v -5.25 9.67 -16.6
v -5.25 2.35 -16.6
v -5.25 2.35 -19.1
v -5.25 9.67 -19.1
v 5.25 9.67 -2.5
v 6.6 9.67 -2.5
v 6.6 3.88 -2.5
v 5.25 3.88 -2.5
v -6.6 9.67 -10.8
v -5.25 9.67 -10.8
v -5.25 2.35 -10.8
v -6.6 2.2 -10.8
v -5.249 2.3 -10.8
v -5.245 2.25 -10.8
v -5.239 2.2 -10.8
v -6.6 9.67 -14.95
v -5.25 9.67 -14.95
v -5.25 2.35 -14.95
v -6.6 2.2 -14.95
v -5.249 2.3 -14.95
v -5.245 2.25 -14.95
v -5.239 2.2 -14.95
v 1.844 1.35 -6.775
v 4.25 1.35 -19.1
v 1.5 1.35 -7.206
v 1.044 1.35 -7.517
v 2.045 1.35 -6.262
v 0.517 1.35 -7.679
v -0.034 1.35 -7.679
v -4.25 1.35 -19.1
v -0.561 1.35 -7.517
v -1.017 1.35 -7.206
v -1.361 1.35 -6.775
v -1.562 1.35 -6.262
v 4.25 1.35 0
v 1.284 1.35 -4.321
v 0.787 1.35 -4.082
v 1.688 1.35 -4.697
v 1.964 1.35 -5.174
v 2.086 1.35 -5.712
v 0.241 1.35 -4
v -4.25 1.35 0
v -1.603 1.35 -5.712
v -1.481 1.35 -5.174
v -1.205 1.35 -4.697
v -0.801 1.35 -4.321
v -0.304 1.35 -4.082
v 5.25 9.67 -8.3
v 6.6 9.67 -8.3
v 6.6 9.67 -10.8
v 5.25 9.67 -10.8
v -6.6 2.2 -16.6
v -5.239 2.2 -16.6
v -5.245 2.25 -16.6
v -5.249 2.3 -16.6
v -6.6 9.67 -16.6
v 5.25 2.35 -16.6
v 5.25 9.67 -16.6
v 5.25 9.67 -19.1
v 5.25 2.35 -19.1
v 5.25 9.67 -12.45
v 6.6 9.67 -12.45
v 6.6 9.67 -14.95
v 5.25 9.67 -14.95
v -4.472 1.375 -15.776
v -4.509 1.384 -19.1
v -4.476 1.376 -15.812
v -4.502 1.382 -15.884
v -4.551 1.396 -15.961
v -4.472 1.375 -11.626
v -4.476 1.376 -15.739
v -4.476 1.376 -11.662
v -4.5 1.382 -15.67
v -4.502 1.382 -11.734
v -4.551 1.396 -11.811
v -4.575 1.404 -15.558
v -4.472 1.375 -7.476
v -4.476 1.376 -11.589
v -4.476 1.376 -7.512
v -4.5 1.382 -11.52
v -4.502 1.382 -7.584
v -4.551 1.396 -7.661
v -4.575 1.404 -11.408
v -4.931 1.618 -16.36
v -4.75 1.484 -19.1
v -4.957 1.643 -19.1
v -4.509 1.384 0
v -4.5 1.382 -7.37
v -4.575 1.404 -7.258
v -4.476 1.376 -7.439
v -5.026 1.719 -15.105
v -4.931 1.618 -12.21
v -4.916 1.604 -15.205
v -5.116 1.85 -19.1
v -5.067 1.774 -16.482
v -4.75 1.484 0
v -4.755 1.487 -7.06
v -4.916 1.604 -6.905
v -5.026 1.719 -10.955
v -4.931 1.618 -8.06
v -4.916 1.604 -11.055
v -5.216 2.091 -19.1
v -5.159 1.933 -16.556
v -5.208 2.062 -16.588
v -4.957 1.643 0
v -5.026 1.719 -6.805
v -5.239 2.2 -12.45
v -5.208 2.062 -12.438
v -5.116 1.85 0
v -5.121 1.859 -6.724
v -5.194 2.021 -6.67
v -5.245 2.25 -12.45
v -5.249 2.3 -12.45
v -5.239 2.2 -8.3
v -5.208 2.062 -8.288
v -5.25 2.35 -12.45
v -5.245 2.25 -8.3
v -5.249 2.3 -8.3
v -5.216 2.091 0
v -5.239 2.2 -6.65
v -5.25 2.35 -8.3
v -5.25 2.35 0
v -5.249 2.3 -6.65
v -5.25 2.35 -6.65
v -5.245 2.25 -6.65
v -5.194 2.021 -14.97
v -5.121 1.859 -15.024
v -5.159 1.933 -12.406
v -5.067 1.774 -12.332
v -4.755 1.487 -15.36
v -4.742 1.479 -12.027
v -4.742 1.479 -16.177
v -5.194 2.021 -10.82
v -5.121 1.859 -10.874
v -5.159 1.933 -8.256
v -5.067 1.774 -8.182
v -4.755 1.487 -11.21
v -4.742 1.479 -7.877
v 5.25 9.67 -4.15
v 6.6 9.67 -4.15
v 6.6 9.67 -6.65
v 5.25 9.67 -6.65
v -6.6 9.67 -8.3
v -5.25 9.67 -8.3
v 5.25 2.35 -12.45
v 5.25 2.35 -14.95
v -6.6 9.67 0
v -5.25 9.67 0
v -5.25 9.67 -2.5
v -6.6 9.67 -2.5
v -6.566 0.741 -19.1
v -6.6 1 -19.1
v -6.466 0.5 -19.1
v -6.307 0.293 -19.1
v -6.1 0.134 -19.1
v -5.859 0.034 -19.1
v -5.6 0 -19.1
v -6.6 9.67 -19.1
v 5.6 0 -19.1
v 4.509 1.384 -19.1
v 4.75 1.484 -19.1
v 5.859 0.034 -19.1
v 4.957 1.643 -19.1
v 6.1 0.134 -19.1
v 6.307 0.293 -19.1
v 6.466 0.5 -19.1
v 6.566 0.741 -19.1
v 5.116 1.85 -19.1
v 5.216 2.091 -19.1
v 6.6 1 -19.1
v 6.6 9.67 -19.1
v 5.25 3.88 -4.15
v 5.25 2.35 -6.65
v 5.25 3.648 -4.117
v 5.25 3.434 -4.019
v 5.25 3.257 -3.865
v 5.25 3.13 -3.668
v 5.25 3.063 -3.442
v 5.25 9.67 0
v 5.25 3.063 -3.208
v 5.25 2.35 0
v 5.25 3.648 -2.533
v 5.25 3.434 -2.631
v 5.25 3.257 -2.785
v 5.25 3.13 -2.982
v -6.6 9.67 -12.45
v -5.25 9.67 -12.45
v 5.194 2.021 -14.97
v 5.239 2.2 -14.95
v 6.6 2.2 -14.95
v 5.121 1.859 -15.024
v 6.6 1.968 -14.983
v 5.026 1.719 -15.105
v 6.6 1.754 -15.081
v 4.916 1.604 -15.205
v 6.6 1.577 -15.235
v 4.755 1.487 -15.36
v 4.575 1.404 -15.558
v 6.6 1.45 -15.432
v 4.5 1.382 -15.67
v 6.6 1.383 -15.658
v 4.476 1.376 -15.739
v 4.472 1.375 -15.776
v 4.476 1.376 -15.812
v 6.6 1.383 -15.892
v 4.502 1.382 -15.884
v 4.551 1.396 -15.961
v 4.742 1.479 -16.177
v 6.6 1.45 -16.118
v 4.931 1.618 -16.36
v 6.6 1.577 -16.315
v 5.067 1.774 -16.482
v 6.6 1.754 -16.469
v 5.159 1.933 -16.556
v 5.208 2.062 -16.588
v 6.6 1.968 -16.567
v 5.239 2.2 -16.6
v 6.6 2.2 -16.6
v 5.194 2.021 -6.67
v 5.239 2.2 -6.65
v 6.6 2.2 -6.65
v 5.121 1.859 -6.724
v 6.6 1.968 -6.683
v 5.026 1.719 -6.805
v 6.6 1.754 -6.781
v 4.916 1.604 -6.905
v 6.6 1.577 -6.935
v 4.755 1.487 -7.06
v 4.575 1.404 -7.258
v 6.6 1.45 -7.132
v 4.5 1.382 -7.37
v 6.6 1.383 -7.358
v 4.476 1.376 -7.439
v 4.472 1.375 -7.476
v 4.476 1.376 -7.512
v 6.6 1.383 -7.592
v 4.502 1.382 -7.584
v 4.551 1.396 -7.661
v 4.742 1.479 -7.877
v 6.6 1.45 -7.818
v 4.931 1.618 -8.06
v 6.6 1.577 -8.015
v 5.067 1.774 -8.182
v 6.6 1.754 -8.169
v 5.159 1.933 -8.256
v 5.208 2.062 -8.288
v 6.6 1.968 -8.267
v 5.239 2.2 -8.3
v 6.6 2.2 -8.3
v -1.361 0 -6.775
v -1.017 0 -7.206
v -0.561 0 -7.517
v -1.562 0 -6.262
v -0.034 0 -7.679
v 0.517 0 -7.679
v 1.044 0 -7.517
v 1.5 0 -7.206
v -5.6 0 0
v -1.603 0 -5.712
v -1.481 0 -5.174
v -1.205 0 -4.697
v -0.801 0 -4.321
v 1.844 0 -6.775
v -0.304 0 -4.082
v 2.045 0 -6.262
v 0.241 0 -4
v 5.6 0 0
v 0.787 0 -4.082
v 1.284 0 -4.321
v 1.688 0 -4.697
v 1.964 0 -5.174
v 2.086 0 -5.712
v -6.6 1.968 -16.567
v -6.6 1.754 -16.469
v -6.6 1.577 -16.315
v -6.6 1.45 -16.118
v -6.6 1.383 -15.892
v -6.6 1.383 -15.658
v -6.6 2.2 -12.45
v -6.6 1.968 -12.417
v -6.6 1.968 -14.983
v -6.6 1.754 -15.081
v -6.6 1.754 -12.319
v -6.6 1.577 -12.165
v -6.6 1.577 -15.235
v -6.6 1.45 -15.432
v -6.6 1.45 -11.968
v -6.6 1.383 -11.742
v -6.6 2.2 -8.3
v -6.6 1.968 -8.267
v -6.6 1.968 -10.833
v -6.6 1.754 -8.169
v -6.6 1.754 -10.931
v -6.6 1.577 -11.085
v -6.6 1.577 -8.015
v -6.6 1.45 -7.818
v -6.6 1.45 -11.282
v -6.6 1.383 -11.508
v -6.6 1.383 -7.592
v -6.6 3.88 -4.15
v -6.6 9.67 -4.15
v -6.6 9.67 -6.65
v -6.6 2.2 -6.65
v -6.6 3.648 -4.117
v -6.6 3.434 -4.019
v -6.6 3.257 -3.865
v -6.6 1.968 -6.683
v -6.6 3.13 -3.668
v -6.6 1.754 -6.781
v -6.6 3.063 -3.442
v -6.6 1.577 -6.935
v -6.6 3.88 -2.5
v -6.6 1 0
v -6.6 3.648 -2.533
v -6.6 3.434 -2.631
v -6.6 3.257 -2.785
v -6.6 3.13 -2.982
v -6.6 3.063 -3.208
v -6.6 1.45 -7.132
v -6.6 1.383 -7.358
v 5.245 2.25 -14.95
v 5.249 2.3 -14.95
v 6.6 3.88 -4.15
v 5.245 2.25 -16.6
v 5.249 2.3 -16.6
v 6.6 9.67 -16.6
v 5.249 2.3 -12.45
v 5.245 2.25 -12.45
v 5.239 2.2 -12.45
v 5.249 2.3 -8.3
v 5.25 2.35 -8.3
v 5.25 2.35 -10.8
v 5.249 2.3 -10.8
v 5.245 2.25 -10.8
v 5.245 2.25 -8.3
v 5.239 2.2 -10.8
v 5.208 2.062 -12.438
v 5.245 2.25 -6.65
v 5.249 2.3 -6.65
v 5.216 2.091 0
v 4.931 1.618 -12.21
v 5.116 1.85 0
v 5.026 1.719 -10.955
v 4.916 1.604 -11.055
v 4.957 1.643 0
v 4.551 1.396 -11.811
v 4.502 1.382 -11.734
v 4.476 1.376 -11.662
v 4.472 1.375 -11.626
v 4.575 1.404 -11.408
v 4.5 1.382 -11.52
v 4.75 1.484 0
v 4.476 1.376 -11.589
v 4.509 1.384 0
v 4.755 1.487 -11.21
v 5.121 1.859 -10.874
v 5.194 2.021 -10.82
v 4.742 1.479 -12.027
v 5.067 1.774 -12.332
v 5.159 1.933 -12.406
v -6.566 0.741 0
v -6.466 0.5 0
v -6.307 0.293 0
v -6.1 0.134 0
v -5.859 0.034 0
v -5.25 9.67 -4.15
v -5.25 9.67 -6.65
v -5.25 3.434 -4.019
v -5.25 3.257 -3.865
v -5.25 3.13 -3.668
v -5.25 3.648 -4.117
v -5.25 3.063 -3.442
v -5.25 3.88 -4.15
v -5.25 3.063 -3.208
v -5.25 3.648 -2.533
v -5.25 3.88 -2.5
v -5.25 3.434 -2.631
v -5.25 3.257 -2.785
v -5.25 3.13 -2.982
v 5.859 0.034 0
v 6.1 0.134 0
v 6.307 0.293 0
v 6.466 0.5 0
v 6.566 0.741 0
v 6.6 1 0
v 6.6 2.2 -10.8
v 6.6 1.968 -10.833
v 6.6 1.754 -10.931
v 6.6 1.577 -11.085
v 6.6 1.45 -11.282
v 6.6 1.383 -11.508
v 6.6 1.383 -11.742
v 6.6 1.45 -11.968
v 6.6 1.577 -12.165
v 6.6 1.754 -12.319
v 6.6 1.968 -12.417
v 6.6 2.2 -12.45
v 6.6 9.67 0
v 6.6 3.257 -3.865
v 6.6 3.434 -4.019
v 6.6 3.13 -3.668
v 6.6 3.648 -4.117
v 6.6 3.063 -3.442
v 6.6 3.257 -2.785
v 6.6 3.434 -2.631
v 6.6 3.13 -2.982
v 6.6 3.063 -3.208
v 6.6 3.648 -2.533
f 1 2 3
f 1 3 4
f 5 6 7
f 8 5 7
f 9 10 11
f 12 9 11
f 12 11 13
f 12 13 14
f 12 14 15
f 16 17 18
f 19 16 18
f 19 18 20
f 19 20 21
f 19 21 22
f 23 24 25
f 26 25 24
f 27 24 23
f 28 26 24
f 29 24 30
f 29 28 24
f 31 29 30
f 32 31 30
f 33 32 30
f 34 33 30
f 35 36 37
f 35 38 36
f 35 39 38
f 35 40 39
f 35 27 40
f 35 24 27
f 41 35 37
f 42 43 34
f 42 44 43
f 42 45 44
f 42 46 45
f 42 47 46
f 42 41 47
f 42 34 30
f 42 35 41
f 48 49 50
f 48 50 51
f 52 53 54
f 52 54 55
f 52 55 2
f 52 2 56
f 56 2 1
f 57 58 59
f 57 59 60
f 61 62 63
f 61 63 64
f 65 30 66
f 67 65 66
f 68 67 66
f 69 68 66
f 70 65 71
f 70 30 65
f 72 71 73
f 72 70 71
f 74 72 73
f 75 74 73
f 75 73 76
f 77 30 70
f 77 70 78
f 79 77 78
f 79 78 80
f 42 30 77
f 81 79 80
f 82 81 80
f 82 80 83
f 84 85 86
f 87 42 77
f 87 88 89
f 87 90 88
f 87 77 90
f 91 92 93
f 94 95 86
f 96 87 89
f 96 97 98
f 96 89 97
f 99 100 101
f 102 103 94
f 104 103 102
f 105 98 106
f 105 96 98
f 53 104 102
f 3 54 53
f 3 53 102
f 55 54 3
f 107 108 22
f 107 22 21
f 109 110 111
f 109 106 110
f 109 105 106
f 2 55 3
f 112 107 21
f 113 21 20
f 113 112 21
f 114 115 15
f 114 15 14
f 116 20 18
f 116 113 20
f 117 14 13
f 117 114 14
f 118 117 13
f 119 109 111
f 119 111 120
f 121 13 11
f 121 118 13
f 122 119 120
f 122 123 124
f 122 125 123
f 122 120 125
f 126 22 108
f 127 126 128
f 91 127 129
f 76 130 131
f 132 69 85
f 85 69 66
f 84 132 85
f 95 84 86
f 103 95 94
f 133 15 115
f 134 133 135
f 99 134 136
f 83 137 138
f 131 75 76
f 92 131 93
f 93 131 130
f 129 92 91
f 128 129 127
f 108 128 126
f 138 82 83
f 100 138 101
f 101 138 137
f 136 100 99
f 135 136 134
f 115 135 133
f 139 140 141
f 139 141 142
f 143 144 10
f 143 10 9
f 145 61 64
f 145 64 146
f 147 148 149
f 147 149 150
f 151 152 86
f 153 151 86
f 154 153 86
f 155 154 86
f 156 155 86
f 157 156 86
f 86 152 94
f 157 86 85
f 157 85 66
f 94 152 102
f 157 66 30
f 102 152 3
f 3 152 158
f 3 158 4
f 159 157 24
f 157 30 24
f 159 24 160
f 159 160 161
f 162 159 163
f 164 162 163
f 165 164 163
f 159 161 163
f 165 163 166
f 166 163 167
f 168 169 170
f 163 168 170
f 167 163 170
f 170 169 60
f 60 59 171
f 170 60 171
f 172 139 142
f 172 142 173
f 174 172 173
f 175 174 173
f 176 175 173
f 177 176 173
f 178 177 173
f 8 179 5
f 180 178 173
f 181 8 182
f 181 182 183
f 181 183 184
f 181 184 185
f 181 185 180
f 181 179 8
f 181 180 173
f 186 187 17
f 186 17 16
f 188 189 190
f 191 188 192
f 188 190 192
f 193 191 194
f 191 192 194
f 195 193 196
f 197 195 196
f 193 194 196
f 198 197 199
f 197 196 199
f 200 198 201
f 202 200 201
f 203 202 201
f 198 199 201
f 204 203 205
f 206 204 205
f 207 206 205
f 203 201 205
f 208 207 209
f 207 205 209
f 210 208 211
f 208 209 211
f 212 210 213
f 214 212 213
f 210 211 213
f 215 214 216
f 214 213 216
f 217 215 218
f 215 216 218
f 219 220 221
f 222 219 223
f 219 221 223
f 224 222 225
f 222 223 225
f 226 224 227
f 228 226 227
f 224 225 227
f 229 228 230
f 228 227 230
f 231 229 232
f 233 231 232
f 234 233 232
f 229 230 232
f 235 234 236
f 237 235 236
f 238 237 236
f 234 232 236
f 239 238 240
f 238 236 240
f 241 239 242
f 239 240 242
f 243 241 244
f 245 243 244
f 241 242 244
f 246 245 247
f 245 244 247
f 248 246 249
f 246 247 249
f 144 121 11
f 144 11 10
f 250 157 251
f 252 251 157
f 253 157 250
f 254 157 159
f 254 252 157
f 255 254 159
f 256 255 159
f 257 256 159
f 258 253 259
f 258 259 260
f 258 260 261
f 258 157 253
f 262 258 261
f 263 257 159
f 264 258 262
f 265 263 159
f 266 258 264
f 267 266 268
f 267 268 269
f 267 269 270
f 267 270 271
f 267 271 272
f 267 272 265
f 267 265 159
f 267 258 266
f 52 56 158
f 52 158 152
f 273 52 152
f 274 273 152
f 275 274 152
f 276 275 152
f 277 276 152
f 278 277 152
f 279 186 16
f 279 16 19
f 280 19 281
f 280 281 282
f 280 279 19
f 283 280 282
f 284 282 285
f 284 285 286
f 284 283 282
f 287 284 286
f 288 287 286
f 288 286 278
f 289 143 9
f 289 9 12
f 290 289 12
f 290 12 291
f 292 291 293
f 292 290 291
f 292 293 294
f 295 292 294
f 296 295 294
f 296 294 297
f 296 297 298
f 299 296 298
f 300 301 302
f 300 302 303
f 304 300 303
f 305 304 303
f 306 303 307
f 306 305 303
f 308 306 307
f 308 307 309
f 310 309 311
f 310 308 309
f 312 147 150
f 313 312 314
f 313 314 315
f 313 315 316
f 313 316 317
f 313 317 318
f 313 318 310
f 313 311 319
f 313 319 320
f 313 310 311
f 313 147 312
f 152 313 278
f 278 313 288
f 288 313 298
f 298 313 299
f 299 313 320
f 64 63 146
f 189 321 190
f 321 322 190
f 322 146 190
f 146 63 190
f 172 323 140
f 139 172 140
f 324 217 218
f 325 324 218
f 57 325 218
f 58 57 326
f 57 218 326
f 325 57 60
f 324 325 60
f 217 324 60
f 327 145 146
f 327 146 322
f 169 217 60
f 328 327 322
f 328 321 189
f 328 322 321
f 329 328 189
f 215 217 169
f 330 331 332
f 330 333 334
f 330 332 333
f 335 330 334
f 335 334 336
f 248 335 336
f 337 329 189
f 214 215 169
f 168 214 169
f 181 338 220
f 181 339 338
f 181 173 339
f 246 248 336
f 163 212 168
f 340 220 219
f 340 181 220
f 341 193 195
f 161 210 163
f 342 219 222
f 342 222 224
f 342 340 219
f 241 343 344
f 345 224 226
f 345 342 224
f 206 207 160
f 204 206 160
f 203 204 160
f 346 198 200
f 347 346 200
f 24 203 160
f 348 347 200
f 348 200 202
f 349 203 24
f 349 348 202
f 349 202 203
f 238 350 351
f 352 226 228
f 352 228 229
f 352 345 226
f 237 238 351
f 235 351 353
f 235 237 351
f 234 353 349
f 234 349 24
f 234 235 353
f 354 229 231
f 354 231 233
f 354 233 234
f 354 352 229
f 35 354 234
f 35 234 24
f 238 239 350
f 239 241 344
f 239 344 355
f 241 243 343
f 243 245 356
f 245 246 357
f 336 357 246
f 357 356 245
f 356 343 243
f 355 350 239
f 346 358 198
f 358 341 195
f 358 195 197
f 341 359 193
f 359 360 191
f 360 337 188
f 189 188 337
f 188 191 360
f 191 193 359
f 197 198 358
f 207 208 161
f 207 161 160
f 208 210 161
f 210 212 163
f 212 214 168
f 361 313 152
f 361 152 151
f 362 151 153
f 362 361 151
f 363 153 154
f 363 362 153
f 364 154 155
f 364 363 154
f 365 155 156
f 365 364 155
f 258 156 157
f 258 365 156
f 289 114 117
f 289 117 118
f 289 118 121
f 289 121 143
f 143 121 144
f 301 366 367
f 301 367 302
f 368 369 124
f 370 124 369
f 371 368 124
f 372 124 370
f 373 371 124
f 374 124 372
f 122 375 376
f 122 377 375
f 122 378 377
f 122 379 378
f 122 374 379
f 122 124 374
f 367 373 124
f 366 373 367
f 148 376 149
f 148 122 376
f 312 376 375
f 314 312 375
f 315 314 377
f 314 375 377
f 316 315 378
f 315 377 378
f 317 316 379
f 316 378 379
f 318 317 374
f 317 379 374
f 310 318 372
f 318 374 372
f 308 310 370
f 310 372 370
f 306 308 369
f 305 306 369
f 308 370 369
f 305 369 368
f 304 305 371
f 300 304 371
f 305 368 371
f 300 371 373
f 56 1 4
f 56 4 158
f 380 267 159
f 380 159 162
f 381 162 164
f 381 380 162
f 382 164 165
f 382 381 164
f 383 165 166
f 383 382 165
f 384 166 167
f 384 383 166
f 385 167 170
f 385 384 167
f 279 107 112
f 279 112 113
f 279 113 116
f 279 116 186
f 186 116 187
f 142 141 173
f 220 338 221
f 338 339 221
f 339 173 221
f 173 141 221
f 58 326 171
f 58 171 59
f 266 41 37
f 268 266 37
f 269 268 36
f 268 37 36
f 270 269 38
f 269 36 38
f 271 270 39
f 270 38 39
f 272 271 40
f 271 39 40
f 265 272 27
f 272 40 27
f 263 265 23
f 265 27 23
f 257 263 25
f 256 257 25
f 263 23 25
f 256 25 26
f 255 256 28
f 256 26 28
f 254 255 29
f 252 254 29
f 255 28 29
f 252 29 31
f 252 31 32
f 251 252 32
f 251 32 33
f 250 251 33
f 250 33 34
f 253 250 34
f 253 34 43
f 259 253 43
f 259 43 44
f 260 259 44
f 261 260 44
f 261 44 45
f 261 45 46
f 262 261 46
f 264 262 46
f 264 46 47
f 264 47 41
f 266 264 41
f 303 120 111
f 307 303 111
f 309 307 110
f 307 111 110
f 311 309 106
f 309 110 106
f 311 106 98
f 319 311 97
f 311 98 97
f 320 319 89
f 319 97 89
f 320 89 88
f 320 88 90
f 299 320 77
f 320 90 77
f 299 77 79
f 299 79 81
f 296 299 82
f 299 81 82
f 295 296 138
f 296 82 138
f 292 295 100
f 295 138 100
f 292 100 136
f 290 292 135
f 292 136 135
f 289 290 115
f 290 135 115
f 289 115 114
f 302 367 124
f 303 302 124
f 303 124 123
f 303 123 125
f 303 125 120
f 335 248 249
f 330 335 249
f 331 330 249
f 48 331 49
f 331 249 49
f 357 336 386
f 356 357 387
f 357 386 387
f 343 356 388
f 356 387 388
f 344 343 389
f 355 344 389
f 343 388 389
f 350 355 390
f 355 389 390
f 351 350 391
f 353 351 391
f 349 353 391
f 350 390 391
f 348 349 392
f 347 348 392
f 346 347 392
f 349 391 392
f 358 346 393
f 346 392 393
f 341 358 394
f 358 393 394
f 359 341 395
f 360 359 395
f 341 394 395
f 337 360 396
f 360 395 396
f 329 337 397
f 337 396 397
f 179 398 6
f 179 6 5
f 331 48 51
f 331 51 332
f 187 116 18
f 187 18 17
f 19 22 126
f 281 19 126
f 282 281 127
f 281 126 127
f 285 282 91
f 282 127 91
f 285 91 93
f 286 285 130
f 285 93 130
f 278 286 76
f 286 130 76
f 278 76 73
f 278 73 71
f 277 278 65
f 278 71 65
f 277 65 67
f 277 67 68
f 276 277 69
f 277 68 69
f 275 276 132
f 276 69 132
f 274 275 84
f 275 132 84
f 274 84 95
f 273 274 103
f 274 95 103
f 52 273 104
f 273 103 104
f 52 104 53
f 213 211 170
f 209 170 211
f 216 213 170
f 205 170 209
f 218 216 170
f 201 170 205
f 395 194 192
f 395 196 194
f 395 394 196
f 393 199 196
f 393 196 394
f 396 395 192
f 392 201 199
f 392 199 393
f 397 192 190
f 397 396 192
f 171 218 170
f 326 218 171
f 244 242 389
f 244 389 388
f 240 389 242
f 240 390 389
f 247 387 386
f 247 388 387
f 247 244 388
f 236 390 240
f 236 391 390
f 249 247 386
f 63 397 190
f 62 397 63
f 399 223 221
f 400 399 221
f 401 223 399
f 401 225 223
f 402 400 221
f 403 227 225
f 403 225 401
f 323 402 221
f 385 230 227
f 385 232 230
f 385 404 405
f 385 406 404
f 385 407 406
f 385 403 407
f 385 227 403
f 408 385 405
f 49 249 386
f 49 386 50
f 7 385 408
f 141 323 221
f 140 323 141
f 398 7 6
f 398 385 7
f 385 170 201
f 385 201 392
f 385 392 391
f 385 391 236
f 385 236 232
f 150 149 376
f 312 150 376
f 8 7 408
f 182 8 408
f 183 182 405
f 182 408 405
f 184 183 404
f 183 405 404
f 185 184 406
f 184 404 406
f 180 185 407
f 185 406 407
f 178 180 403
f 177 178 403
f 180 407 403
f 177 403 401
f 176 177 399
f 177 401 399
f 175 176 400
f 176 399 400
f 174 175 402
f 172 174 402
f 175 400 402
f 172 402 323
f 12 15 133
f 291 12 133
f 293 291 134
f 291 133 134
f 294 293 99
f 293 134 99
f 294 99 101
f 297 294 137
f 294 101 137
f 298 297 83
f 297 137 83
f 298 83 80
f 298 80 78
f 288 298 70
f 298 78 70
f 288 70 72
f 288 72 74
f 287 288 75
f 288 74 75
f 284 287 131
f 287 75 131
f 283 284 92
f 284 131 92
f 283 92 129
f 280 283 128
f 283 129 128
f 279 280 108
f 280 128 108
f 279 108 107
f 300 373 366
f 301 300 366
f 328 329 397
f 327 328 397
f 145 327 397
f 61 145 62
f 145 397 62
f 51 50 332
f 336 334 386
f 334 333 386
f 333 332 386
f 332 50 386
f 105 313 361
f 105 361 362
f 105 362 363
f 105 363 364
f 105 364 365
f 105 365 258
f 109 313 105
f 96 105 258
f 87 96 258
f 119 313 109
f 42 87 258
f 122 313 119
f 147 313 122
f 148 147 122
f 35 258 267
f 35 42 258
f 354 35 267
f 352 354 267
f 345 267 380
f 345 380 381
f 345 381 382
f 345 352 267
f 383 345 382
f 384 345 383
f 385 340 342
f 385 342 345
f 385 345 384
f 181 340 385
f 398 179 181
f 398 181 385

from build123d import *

# Parameters (mm, degrees)
BOSS_EXTRUDE3_DEPTH = 19.1
CUT_EXTRUDE2_REACH  = 23.854
SKETCH3_R           = 1.85
CUT_EXTRUDE3_DEPTH  = 26.150723648


with BuildPart() as part:
    # Sketch1 → Boss-Extrude3 (new body)
    with BuildSketch(Plane.XY):
        with BuildLine():
            Line((-5.6, 0), (5.6, 0))
            ThreePointArc((5.6, 0), (6.307106781, 0.292893219), (6.6, 1))
            Line((6.6, 1), (6.6, 9.67))
            Line((6.6, 9.67), (5.25, 9.67))
            Line((5.25, 9.67), (5.25, 2.35))
            ThreePointArc((5.25, 2.35), (4.957106781, 1.642893219), (4.25, 1.35))
            Line((4.25, 1.35), (-4.25, 1.35))
            ThreePointArc((-4.25, 1.35), (-4.957106781, 1.642893219), (-5.25, 2.35))
            Line((-5.25, 2.35), (-5.25, 9.67))
            Line((-5.25, 9.67), (-6.6, 9.67))
            Line((-6.6, 9.67), (-6.6, 1))
            ThreePointArc((-6.6, 1), (-6.307106781, 0.292893219), (-5.6, 0))
        make_face()
    extrude(amount=-BOSS_EXTRUDE3_DEPTH)

    # Sketch3 → Cut-Extrude2 (cut, up to next)
    with BuildSketch(Plane(origin=(0, 1.35, 0), x_dir=(1, 0, 0), z_dir=(0, 1, 0)), mode=Mode.PRIVATE) as cut_extrude2_sk1:
        with Locations(Location((0.241401012, 5.85, 0), (0, 0, 270))):
            Circle(SKETCH3_R)
    cut_extrude2_tool1 = extrude(cut_extrude2_sk1.sketch, amount=-CUT_EXTRUDE2_REACH, mode=Mode.PRIVATE) & part.part
    add(cut_extrude2_tool1.solids().sort_by_distance((0.241401, 1.35, -5.85))[0], mode=Mode.SUBTRACT)

    # Sketch4 → Cut-Extrude3 (cut, through all)
    with BuildSketch(Plane(origin=(6.6, 0, 0), x_dir=(0, 0, -1), z_dir=(1, 0, 0))):
        with BuildLine():
            Line((2.5, 9.67), (2.5, 3.88))
            ThreePointArc((2.5, 3.88), (3.325, 3.055), (4.15, 3.88))
            Line((4.15, 3.88), (4.15, 9.67))
            Line((4.15, 9.67), (2.5, 9.67))
        make_face()
        with BuildLine():
            Line((6.65, 9.67), (6.65, 2.2))
            ThreePointArc((6.65, 2.2), (7.475, 1.375), (8.3, 2.2))
            Line((8.3, 2.2), (8.3, 9.67))
            Line((8.3, 9.67), (6.65, 9.67))
        make_face()
        with BuildLine():
            Line((10.8, 9.67), (10.8, 2.2))
            ThreePointArc((10.8, 2.2), (11.625, 1.375), (12.45, 2.2))
            Line((12.45, 2.2), (12.45, 9.67))
            Line((12.45, 9.67), (10.8, 9.67))
        make_face()
        with BuildLine():
            Line((14.95, 9.67), (14.95, 2.2))
            ThreePointArc((14.95, 2.2), (15.775, 1.375), (16.6, 2.2))
            Line((16.6, 2.2), (16.6, 9.67))
            Line((16.6, 9.67), (14.95, 9.67))
        make_face()
    extrude(amount=-CUT_EXTRUDE3_DEPTH, mode=Mode.SUBTRACT)


solid = part.part
